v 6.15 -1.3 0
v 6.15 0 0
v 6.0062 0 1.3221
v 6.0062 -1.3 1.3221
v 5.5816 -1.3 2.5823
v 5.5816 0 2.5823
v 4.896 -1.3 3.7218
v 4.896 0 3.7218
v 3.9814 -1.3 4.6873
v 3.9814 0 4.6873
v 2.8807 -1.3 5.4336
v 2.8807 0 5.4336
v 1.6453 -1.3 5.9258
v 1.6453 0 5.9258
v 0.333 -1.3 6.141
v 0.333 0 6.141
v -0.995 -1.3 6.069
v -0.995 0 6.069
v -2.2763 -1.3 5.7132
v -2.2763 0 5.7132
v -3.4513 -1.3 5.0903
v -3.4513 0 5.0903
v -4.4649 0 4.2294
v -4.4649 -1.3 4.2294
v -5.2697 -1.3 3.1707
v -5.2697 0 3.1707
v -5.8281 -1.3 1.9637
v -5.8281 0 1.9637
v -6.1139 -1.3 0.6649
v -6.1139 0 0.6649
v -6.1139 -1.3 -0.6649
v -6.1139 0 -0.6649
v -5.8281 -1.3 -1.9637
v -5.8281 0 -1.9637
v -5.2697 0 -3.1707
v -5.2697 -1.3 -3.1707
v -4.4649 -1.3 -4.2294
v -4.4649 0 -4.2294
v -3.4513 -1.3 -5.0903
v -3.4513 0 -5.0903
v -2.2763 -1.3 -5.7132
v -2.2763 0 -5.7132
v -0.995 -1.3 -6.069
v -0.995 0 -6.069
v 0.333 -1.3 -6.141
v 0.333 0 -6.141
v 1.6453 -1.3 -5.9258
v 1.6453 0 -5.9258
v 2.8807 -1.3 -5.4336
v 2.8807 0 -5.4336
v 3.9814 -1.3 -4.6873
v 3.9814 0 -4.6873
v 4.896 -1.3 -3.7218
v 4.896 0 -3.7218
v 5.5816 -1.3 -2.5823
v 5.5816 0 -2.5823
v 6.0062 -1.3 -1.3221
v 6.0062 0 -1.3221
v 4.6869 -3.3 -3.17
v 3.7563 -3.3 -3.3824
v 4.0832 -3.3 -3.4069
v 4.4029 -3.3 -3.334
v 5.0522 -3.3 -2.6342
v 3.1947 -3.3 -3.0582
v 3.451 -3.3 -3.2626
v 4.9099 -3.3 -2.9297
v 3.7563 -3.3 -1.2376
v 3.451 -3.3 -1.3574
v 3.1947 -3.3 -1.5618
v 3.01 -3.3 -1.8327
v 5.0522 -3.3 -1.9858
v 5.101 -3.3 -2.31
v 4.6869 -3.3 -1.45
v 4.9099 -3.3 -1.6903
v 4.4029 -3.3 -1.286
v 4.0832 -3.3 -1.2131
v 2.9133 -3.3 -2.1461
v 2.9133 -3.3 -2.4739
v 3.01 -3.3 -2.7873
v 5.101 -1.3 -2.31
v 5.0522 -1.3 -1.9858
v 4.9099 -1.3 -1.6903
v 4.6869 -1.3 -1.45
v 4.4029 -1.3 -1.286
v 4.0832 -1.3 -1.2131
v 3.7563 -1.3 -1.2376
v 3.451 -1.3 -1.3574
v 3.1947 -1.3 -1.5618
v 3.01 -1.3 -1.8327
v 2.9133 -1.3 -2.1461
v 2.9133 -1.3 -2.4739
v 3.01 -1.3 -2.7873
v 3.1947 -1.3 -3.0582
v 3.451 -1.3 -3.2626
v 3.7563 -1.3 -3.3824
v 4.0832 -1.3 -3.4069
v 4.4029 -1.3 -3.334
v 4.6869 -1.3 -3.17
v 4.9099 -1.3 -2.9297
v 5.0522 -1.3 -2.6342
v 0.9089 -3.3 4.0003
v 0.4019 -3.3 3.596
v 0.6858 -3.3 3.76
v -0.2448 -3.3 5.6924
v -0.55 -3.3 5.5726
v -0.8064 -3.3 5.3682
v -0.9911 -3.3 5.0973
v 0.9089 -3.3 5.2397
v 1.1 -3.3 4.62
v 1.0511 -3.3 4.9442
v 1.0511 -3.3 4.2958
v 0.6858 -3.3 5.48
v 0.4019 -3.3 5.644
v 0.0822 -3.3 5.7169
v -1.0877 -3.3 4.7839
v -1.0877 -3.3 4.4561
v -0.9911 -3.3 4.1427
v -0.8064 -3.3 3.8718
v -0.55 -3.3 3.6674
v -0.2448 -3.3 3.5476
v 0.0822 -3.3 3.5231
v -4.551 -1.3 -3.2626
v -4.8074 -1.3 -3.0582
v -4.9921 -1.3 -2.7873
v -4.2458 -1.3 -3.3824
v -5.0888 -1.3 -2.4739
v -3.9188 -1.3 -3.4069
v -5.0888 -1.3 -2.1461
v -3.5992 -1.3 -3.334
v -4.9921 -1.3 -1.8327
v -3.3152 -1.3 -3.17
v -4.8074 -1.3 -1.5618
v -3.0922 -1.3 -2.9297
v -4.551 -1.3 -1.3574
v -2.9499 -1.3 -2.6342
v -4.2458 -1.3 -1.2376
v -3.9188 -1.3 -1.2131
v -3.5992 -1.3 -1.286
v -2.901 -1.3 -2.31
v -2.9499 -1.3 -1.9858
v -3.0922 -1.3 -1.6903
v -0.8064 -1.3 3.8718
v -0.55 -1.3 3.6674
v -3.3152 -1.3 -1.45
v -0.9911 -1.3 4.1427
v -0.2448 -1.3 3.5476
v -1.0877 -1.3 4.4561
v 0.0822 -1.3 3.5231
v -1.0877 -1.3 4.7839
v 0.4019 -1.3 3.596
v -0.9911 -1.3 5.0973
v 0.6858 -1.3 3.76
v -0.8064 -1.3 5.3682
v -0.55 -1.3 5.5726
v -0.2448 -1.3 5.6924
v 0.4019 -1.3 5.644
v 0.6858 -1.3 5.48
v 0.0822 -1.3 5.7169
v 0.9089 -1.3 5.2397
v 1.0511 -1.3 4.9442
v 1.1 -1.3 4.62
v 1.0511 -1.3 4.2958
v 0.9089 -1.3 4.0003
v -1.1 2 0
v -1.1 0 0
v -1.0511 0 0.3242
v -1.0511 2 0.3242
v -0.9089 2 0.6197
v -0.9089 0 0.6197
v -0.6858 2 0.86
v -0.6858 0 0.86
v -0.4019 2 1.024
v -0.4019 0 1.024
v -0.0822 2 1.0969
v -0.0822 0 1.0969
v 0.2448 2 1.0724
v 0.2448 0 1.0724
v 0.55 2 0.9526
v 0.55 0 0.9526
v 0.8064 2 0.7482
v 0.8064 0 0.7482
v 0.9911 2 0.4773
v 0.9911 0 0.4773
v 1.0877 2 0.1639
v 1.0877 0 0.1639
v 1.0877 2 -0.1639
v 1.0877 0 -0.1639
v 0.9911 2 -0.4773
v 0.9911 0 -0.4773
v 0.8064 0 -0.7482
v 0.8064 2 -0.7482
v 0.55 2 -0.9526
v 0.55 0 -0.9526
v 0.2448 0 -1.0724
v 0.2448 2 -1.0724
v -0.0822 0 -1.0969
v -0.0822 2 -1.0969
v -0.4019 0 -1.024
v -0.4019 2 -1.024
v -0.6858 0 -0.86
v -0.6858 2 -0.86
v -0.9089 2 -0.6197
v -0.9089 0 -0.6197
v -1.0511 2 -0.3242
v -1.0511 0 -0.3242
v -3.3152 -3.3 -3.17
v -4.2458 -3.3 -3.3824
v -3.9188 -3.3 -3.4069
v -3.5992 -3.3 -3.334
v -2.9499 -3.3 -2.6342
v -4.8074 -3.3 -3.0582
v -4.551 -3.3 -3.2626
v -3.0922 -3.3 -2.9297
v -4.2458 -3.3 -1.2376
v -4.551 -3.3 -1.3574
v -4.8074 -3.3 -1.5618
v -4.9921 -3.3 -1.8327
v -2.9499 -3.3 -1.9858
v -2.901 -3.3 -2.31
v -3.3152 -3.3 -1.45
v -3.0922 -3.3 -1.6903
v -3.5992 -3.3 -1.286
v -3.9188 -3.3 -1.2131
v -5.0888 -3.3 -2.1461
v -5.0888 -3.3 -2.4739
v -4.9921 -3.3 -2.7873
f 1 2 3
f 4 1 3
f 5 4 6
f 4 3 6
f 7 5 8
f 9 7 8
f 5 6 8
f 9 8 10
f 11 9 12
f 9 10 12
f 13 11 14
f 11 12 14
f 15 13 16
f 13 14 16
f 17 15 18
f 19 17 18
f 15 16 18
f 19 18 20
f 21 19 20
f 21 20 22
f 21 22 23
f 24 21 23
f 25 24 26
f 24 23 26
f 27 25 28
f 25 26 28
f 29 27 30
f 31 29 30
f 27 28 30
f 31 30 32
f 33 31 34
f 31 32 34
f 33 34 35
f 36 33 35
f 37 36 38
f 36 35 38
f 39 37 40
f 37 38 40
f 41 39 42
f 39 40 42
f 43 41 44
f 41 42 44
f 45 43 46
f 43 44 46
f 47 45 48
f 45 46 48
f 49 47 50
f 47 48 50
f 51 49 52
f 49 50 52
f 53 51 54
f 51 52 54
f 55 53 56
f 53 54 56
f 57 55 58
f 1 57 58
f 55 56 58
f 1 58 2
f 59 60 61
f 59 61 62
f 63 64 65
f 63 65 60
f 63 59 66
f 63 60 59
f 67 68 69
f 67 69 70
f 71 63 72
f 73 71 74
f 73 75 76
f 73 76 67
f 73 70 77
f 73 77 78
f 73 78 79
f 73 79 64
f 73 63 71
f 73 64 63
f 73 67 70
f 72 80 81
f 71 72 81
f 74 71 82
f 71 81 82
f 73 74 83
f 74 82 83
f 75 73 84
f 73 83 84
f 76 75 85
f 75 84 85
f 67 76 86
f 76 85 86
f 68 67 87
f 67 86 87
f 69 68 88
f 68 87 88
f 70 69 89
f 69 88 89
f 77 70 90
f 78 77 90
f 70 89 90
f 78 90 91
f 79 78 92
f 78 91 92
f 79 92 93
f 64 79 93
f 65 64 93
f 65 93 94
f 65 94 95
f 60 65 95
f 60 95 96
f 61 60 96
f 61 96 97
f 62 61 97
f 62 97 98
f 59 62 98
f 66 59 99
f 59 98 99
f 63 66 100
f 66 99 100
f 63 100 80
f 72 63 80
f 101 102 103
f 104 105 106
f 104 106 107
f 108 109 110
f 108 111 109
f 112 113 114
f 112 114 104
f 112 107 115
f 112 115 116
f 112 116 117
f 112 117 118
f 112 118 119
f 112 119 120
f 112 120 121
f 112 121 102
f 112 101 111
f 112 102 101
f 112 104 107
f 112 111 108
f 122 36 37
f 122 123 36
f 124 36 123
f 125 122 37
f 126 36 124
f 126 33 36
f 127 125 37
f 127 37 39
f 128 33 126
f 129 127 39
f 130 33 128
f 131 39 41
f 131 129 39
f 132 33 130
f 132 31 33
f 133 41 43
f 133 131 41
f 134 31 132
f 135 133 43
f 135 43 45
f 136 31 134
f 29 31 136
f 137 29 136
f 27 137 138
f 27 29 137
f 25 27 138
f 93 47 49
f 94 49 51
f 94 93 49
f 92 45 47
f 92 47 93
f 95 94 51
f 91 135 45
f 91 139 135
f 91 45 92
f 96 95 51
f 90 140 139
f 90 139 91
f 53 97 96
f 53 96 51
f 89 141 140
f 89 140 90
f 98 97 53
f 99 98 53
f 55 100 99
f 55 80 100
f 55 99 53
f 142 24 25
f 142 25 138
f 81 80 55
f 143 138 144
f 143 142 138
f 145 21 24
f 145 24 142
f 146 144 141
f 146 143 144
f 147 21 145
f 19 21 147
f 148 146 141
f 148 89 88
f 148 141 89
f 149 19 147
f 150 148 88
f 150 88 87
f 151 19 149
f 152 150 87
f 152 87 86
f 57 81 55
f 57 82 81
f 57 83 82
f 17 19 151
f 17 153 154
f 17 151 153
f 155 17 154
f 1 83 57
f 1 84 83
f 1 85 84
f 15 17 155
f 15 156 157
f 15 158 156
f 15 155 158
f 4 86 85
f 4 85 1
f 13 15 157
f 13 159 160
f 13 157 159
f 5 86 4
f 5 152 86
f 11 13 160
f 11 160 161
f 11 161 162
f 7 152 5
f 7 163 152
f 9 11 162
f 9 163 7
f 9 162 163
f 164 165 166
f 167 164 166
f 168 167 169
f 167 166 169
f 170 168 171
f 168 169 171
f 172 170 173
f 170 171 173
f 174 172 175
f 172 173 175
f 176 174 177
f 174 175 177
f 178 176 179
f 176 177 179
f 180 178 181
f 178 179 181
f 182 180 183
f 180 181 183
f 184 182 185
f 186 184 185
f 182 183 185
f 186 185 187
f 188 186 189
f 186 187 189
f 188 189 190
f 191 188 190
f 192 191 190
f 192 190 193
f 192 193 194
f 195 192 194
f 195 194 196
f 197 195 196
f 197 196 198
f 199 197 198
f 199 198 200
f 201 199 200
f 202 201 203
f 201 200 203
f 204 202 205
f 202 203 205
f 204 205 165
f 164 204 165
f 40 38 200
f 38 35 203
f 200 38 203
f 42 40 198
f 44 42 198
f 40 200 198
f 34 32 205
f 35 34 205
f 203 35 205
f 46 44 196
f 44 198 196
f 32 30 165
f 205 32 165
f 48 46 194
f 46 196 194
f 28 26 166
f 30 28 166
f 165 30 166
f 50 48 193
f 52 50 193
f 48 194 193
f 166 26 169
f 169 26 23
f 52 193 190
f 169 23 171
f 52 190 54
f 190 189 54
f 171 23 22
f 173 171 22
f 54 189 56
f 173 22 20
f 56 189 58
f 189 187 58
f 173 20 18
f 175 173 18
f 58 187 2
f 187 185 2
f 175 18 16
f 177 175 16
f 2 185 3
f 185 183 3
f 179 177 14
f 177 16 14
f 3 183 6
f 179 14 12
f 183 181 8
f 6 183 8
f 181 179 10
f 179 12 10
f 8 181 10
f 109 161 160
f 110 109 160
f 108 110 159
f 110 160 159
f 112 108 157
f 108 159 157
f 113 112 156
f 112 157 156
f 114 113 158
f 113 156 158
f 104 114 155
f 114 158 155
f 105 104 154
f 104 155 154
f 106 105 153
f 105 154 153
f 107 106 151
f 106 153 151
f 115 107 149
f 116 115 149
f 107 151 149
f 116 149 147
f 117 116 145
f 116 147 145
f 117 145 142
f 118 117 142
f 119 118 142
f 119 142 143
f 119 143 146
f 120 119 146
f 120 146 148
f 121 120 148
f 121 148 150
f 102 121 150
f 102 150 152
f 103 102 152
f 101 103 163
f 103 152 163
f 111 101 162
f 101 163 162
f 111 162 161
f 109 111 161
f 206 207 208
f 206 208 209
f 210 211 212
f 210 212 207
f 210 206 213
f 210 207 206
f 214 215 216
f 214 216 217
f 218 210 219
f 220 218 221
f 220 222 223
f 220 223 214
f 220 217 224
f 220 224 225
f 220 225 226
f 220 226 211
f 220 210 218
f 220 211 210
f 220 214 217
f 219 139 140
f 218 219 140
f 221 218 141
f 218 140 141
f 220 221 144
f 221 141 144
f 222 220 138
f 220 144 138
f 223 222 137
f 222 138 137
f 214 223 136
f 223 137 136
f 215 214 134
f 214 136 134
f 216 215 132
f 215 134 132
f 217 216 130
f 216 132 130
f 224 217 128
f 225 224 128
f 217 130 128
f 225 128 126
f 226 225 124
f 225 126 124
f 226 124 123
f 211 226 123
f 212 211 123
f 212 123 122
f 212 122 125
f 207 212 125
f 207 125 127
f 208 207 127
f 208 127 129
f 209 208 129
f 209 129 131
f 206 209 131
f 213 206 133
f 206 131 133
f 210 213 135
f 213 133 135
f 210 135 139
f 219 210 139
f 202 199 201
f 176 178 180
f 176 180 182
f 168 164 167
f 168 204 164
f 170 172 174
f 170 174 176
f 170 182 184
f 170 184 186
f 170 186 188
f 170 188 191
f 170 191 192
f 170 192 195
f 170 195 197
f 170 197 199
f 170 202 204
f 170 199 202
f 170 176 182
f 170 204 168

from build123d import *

# Parameters (mm, degrees)
F0_R     = 6.15
F1_DEPTH = 1.3
F2_R     = 1.1
F3_DEPTH = 2
F4_R     = 1.1
F5_DEPTH = 2


with BuildPart() as f1:
    # F0 (on Front) → F1 (new body)
    with BuildSketch(Plane.XZ):
        Circle(F0_R)
    extrude(amount=F1_DEPTH)

    # F2 (on face) → F3 (join)
    with BuildSketch(Plane.XZ.offset(1.3)):
        with Locations((0, 4.62)):
            Circle(F2_R)
        with Locations((-4.0010373655, -2.31)):
            Circle(F2_R)
        with Locations((4.0010373655, -2.31)):
            Circle(F2_R)
    extrude(amount=F3_DEPTH)

    # F4 (on face) → F5 (join)
    with BuildSketch(Plane(origin=(0, 0, 0), x_dir=(-1, 0, 0), z_dir=(0, 1, 0))):
        Circle(F4_R)
    extrude(amount=F5_DEPTH)


solid = f1.part
